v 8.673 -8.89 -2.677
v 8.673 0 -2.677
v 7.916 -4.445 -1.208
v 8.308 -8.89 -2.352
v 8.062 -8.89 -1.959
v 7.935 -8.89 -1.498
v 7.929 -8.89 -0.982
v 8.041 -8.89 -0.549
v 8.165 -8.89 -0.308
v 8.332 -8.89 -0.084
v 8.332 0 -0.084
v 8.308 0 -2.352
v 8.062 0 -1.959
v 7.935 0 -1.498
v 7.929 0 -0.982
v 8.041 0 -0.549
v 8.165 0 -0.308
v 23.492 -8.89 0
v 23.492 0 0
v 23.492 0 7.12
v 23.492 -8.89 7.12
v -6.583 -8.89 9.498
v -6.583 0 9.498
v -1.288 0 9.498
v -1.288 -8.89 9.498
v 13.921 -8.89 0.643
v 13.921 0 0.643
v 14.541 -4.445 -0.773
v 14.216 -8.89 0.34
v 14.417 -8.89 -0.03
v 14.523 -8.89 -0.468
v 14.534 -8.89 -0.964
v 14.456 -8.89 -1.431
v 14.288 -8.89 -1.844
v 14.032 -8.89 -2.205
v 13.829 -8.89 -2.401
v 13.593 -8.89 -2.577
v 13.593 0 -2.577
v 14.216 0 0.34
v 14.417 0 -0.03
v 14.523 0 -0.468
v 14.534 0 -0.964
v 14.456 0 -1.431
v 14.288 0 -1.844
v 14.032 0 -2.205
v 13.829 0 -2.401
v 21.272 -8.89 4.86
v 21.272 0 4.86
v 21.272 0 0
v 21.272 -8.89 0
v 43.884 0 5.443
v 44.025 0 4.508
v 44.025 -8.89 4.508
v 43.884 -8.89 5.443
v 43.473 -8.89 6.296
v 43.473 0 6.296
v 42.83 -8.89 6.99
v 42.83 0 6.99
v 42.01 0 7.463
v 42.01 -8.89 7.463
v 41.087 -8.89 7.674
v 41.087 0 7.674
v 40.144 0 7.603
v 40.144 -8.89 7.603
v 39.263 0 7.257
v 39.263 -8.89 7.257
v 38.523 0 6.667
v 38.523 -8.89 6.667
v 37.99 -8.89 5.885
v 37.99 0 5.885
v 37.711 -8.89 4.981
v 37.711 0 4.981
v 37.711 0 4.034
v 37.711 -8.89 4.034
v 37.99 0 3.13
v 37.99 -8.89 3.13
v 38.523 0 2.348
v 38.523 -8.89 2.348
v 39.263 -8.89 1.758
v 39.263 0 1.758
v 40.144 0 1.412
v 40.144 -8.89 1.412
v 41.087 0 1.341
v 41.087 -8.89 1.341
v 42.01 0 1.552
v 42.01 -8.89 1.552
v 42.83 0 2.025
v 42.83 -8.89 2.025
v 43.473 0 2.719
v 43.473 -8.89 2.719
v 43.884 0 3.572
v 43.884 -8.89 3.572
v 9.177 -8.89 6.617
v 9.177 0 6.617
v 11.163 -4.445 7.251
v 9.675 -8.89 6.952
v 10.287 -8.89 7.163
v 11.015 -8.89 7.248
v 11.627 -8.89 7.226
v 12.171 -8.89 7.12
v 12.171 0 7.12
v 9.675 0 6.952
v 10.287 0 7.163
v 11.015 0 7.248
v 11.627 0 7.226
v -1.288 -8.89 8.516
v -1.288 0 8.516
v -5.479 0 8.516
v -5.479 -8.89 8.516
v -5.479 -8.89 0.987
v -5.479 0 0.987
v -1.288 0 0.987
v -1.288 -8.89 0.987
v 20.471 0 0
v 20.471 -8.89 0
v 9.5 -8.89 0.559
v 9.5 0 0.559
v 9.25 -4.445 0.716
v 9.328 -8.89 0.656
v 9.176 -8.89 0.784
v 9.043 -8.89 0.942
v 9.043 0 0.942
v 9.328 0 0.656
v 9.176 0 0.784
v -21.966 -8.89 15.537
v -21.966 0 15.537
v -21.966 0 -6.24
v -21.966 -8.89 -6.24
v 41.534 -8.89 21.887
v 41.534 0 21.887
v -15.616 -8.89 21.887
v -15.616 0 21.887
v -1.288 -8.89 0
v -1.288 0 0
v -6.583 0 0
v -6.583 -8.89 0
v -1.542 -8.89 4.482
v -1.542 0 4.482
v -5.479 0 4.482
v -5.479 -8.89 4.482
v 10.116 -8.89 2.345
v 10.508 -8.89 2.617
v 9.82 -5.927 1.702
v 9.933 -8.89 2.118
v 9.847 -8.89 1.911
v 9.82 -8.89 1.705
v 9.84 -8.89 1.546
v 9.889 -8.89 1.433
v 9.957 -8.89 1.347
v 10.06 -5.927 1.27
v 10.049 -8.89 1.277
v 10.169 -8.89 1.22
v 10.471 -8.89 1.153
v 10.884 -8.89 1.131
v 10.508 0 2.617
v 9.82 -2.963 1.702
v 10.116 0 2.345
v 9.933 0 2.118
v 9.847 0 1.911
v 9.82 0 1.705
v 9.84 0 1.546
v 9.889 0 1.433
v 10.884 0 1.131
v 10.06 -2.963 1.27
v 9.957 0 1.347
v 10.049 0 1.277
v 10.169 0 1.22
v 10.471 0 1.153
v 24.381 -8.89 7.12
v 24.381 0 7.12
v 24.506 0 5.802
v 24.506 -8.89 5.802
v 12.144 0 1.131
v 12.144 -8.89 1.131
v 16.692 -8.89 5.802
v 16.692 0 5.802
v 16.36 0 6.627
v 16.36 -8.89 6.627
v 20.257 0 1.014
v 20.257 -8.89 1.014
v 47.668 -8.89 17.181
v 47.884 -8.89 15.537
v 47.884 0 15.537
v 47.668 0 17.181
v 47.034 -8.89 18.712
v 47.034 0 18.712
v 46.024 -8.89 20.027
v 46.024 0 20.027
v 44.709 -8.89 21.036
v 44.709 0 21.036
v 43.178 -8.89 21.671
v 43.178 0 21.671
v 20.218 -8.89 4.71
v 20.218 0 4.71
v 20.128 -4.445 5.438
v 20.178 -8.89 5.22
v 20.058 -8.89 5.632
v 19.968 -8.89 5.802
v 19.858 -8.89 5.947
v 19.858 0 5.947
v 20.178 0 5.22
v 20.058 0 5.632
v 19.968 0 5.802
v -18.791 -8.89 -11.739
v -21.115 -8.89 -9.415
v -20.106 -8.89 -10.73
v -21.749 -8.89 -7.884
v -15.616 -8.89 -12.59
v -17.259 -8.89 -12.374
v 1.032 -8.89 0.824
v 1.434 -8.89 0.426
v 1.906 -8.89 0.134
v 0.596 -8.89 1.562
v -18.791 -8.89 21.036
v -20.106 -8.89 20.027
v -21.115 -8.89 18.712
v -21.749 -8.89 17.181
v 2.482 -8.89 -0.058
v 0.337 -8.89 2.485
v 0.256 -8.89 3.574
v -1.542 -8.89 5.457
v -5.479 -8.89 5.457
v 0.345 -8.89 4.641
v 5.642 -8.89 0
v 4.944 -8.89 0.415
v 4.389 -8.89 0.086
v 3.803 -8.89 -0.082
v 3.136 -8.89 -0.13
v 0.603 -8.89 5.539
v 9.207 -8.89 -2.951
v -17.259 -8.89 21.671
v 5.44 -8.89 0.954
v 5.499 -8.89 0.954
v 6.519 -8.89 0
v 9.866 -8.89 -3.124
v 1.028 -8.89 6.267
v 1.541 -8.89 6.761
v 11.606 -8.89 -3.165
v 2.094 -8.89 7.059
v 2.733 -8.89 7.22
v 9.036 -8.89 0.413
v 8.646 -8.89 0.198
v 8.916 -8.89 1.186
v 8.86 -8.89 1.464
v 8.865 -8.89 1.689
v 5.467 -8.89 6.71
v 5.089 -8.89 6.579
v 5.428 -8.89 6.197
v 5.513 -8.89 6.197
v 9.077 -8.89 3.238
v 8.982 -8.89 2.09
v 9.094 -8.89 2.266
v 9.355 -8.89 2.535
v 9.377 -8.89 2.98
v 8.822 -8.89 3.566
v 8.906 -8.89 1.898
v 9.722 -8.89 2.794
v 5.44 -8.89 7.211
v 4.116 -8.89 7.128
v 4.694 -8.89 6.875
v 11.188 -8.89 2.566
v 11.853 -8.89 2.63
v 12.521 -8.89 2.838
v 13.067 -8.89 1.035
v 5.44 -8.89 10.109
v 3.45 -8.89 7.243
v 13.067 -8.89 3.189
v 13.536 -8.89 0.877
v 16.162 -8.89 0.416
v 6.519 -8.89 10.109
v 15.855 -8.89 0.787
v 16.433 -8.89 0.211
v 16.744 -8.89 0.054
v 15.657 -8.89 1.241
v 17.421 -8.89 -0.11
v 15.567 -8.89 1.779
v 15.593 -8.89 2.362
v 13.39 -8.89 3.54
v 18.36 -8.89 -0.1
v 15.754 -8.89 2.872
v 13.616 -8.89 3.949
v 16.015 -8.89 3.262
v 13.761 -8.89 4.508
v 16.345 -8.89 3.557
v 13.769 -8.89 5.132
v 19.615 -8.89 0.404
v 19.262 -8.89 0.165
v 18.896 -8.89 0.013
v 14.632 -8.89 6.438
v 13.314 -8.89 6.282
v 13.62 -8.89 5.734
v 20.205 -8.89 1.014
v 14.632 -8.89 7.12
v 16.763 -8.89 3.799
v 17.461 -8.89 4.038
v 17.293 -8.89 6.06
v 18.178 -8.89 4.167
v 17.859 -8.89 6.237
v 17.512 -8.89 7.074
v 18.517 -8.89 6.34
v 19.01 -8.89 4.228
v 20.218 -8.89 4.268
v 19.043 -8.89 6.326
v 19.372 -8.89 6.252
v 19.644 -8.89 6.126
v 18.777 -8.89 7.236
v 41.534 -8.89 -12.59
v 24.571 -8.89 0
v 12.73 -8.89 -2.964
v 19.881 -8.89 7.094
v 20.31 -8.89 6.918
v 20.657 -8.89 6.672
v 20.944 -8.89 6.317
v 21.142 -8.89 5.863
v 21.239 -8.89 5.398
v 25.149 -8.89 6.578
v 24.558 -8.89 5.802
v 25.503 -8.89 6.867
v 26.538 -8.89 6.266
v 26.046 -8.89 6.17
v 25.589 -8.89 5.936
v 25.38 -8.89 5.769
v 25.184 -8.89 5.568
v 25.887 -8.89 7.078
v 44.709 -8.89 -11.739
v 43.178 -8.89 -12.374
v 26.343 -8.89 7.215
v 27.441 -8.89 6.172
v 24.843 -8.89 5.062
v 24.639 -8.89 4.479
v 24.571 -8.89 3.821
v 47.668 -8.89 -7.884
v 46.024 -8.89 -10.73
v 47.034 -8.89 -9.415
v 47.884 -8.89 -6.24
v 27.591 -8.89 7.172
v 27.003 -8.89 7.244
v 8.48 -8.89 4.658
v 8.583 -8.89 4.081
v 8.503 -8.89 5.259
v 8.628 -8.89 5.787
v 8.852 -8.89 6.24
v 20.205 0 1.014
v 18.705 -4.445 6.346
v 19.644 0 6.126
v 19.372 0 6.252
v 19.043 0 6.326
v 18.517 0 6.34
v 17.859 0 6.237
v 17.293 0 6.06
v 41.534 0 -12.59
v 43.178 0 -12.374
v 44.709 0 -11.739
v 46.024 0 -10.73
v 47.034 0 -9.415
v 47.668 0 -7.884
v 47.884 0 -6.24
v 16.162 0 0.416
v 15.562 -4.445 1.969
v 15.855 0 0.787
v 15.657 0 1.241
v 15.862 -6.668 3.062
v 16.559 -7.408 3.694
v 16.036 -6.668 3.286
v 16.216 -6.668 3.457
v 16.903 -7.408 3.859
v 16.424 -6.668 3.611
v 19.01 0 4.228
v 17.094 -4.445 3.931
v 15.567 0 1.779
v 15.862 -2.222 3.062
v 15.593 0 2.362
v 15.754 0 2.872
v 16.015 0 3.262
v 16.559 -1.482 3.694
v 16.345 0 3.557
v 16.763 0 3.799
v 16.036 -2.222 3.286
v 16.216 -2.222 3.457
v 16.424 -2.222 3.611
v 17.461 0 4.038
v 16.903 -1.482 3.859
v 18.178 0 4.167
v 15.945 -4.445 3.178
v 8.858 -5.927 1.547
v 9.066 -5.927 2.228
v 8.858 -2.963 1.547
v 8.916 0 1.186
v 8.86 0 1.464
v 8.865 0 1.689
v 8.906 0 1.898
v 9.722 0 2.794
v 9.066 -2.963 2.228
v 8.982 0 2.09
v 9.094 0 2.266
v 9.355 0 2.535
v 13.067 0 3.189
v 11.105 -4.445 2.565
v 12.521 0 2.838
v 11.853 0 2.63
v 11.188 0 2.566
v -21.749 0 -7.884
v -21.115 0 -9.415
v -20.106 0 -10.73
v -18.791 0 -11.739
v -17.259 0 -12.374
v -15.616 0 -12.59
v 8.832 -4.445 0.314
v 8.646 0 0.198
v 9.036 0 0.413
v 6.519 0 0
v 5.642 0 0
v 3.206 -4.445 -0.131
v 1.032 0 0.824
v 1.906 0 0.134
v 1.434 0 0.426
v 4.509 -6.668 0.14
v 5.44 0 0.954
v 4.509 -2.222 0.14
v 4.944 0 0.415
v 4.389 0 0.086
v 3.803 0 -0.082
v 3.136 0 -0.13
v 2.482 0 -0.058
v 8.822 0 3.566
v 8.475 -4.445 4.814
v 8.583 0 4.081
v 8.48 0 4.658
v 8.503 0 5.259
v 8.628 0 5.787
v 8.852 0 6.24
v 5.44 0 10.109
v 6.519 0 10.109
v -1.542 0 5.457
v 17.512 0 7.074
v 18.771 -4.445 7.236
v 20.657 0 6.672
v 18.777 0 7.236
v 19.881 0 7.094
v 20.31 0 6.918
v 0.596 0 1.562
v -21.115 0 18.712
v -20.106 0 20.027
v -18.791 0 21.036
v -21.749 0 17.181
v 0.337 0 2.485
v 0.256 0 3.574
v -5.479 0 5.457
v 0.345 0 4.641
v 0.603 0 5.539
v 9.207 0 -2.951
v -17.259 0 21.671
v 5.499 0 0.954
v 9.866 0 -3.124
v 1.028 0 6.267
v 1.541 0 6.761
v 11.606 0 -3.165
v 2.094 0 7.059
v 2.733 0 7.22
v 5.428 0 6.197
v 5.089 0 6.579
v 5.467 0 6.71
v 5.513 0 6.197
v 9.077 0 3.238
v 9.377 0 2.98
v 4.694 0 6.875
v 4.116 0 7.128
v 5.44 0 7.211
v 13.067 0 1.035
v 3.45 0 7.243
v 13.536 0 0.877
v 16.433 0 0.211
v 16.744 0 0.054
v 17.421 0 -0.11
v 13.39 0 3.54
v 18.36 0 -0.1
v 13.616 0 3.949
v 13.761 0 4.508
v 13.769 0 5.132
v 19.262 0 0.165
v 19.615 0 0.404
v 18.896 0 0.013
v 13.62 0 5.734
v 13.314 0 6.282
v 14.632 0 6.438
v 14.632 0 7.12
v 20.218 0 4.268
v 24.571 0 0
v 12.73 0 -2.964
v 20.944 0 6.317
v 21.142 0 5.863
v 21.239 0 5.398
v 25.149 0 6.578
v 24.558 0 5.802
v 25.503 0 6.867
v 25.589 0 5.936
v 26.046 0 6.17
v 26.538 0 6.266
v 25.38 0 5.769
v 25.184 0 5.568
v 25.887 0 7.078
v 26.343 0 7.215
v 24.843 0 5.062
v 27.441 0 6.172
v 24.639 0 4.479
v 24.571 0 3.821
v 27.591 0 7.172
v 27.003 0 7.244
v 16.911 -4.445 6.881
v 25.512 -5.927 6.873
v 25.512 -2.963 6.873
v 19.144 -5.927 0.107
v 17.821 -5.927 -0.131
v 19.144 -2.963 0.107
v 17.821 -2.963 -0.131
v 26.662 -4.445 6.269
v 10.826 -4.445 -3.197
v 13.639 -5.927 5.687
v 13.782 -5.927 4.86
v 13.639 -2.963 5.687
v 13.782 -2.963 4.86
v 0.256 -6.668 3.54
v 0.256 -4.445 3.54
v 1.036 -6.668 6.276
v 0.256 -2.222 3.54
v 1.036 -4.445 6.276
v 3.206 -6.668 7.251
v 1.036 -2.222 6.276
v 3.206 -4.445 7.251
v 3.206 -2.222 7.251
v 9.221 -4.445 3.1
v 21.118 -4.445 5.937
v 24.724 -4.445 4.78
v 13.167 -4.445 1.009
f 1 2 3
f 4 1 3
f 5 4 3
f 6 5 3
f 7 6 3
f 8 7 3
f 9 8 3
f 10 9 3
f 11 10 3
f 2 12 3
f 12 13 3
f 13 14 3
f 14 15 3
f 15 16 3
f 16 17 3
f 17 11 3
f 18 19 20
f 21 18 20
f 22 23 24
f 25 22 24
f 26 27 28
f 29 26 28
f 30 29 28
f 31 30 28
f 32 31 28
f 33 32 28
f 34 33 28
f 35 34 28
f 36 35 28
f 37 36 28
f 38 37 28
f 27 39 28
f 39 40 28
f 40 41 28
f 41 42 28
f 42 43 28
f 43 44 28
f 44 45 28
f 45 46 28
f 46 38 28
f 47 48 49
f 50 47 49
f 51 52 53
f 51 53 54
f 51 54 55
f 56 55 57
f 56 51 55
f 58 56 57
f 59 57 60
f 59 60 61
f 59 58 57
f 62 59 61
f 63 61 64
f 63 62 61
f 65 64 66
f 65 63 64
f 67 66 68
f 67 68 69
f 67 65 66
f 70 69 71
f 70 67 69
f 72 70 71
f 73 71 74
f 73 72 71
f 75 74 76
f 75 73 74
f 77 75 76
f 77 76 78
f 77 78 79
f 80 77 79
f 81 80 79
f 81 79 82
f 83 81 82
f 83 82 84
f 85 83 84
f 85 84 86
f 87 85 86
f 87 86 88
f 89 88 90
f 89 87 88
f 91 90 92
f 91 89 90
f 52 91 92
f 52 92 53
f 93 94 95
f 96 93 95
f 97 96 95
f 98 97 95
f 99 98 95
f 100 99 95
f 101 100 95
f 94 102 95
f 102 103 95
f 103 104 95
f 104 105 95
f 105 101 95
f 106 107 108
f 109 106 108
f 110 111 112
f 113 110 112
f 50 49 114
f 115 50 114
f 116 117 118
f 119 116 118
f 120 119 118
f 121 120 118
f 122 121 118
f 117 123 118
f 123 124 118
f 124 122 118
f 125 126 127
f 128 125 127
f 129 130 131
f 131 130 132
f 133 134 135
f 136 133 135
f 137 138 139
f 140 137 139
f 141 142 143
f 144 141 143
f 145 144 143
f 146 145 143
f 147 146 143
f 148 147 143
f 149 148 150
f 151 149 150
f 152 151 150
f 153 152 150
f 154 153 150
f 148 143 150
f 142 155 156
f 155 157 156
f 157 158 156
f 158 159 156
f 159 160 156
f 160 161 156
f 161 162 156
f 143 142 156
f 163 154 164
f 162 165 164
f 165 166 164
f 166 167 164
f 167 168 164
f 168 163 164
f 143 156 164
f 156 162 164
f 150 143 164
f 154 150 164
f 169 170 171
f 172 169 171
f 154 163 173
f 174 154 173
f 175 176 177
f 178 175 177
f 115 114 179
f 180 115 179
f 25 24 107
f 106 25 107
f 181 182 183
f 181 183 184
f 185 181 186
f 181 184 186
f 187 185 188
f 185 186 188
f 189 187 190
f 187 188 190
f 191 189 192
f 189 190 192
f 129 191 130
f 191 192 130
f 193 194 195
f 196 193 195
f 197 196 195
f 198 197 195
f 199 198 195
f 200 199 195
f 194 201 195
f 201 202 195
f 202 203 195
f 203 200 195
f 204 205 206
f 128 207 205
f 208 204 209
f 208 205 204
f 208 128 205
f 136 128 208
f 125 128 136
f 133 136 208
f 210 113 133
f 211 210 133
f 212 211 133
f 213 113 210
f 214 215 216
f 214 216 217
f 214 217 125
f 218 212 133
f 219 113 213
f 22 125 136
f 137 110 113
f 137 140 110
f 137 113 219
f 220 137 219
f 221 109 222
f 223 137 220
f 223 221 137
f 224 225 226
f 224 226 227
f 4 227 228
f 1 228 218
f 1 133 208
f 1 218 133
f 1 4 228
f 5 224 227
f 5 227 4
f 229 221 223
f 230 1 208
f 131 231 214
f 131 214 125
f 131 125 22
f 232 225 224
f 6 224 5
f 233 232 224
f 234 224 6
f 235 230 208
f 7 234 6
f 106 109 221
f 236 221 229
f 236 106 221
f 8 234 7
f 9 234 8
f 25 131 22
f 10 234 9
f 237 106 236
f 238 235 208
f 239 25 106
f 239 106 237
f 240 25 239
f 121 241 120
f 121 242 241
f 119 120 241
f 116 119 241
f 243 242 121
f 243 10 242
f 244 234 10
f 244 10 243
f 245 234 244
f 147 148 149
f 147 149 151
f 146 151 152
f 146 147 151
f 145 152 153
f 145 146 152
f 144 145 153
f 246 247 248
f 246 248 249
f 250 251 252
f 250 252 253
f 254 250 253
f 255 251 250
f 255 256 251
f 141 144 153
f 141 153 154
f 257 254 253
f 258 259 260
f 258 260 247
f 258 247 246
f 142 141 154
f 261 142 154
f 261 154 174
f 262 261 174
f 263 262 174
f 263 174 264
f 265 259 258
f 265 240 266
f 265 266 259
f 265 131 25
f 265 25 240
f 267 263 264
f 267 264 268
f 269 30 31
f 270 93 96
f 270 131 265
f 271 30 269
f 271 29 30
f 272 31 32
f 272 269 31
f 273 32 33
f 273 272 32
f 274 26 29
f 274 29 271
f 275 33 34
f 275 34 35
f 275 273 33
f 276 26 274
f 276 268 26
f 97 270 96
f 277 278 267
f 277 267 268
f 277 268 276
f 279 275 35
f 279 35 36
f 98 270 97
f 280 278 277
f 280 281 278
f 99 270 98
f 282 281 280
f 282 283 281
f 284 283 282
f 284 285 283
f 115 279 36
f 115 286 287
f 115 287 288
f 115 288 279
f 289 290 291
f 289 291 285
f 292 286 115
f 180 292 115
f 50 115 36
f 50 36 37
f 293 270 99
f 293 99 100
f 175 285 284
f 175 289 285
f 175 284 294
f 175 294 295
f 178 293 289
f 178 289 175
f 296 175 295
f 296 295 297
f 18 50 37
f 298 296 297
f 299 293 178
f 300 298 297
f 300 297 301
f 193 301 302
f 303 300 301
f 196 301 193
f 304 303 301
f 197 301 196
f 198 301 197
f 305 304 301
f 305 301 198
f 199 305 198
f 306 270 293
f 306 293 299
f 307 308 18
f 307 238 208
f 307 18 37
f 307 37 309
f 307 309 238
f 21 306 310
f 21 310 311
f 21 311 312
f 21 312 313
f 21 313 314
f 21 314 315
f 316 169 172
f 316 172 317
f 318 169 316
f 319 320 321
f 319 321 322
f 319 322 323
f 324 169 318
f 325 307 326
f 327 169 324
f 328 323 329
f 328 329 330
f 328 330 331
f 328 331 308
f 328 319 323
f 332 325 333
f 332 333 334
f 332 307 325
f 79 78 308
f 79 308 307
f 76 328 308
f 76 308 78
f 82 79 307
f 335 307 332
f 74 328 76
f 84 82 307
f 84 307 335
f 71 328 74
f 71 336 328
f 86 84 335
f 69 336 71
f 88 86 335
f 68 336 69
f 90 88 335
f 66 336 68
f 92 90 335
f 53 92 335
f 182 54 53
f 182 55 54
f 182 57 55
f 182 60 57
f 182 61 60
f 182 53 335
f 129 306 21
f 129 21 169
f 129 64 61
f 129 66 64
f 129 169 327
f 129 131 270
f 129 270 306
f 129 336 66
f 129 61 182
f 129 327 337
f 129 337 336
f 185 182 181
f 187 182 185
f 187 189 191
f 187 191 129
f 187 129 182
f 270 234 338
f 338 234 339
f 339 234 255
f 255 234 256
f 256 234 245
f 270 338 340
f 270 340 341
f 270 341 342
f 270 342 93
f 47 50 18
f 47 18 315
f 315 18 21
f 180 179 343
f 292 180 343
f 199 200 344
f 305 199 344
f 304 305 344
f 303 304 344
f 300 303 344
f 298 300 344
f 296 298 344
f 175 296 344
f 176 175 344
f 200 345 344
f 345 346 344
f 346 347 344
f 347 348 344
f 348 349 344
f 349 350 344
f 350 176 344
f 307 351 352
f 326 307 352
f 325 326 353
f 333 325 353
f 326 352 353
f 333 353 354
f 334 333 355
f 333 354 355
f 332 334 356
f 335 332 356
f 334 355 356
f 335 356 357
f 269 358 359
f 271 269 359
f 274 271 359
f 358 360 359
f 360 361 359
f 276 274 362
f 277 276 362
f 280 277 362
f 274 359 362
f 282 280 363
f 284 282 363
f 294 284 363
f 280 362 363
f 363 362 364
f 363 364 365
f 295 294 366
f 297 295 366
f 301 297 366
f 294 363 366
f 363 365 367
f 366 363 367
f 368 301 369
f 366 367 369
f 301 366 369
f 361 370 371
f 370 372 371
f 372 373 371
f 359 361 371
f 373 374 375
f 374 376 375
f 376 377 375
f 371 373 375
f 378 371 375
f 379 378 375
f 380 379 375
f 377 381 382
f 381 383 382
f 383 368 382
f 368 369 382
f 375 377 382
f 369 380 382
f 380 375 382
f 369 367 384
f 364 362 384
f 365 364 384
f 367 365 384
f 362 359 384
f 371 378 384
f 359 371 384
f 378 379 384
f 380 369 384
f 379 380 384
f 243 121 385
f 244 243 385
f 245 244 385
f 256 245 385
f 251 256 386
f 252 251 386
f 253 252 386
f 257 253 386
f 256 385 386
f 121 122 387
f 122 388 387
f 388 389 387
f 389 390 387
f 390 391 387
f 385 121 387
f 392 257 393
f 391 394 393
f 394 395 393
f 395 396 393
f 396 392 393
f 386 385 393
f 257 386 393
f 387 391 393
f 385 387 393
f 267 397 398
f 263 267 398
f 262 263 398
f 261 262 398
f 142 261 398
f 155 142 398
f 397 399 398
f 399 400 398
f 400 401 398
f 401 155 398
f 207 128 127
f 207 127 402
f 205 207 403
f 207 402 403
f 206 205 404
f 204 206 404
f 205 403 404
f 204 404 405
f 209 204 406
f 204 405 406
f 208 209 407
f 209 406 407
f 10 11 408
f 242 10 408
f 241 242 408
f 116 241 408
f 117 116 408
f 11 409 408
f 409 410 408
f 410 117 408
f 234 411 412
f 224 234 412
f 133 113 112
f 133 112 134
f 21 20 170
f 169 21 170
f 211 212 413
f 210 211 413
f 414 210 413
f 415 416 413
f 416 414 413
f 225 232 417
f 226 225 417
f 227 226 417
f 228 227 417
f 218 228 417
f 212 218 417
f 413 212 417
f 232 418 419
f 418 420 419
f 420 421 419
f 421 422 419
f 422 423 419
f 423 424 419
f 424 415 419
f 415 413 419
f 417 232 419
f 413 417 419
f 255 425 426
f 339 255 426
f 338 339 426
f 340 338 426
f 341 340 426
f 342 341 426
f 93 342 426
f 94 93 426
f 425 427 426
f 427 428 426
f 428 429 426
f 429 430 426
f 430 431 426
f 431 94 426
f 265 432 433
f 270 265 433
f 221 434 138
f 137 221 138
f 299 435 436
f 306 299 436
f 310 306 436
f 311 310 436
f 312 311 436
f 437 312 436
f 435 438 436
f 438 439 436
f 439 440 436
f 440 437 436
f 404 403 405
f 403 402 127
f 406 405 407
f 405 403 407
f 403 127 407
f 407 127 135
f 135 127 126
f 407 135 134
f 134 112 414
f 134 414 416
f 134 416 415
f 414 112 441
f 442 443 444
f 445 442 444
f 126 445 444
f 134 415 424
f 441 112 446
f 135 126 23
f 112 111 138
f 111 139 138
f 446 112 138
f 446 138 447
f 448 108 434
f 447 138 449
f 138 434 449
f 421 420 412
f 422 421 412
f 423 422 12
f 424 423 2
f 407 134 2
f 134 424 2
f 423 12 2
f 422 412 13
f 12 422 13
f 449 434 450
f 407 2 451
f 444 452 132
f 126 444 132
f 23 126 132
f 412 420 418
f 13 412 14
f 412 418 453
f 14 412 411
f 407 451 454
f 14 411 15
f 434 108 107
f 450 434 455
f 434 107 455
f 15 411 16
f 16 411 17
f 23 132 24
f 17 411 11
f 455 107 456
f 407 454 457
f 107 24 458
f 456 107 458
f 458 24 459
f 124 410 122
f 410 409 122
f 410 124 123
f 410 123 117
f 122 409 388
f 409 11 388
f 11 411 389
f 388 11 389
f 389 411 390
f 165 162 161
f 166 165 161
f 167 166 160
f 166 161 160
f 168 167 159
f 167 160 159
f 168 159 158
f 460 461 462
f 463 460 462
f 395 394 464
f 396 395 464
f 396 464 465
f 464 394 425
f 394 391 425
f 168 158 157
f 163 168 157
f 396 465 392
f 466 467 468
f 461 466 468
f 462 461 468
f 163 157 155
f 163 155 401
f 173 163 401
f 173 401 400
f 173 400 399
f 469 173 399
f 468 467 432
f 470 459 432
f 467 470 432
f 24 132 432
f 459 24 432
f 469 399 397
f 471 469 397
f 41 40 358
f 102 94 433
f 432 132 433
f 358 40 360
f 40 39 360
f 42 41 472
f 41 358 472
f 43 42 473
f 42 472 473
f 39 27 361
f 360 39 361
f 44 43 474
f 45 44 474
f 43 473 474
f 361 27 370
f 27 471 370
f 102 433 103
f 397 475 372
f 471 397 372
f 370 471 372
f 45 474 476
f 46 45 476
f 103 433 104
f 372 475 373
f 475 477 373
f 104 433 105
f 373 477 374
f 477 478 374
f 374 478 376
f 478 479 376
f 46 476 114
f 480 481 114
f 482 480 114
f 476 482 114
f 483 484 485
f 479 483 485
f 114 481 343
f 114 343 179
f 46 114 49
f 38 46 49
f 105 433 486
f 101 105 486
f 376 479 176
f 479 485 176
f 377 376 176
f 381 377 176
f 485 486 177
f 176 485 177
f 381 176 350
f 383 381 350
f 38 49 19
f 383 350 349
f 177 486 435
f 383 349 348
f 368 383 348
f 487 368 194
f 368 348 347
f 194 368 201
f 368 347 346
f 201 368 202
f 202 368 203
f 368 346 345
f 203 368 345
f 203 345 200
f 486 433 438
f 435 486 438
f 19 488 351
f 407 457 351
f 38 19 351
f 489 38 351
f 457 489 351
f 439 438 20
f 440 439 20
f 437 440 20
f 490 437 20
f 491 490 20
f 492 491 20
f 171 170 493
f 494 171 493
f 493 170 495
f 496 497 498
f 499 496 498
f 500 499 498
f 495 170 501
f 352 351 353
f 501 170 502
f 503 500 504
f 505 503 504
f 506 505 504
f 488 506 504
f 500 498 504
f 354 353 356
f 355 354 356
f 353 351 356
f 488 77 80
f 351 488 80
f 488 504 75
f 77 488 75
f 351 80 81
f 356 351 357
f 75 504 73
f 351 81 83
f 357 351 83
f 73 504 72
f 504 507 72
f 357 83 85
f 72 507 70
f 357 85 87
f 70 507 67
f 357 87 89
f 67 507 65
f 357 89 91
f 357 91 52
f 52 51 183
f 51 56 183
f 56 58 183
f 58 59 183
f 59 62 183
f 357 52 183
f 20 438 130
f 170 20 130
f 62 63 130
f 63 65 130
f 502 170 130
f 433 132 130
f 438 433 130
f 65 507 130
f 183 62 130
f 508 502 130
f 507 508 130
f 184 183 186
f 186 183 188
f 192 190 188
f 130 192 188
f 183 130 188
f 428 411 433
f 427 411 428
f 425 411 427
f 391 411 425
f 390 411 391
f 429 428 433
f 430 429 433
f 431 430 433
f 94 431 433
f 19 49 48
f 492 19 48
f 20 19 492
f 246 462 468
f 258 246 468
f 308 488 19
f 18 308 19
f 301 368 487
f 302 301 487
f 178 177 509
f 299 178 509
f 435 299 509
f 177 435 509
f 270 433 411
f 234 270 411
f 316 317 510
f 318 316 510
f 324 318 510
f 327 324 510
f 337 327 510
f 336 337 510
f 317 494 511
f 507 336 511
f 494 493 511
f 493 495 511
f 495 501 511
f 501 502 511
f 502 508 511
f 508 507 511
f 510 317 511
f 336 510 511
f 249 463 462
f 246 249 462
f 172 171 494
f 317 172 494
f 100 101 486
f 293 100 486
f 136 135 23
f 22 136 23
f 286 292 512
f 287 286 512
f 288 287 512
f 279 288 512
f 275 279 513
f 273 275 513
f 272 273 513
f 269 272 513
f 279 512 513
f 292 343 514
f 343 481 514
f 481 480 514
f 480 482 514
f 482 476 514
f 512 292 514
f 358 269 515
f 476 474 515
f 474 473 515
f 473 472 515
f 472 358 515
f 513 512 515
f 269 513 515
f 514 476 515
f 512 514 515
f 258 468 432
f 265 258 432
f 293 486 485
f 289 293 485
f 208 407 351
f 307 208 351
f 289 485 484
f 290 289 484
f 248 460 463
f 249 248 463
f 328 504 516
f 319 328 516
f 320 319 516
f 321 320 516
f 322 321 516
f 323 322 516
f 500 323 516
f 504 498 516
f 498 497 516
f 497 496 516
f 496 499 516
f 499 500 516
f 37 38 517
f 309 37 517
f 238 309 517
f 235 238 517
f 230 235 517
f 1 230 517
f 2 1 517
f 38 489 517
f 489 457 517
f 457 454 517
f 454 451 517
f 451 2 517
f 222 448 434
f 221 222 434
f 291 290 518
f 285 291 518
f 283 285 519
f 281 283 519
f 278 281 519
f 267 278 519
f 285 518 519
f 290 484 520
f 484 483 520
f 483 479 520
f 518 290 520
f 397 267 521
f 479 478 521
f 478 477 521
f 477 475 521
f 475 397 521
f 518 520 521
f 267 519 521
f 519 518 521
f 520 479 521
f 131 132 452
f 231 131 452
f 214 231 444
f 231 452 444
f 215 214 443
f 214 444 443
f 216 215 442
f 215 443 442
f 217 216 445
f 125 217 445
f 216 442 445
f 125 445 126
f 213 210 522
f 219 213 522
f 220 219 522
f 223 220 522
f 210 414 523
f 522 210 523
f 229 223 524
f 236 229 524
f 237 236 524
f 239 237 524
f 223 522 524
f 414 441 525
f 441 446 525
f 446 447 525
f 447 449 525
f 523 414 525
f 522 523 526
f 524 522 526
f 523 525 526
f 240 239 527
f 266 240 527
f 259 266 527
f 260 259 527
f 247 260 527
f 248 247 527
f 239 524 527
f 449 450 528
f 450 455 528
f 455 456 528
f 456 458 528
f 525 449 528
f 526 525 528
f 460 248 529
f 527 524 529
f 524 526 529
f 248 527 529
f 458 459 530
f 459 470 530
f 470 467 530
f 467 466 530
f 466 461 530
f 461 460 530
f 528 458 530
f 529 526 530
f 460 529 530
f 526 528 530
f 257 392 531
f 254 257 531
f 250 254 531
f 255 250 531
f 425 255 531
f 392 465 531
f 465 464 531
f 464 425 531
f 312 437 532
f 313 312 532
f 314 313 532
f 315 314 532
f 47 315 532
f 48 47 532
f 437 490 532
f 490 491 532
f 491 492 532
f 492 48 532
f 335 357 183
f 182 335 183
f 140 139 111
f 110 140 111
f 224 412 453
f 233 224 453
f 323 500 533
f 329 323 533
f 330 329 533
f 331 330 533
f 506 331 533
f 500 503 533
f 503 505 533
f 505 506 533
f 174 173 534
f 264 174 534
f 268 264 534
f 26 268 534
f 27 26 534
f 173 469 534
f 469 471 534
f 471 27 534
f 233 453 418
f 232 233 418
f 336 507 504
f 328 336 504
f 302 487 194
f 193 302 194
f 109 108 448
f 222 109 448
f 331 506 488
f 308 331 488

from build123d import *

# Parameters (mm, degrees)
F0_R     = 3.175
F1_DEPTH = 8.89


with BuildPart() as f1:
    # F0 (on Front) → F1 (new body)
    with BuildSketch(Plane.XZ):
        with BuildLine():
            ThreePointArc((-21.9656324044, -6.2401519575), (-20.1057604649, -10.7302800181), (-15.6156324044, -12.5901519575))
            Line((-15.6156324044, -12.5901519575), (41.5343675956, -12.5901519575))
            ThreePointArc((41.5343675956, -12.5901519575), (46.0244956561, -10.7302800181), (47.8843675956, -6.2401519575))
            Line((47.8843675956, -6.2401519575), (47.8843675956, 15.5370884062))
            ThreePointArc((47.8843675956, 15.5370884062), (46.0244956561, 20.0272164667), (41.5343675956, 21.8870884062))
            Line((41.5343675956, 21.8870884062), (-15.6156324044, 21.8870884062))
            ThreePointArc((-15.6156324044, 21.8870884062), (-20.1057604649, 20.0272164667), (-21.9656324044, 15.5370884062))
            Line((-21.9656324044, 15.5370884062), (-21.9656324044, -6.2401519575))
        make_face()
        with BuildLine():
            Line((12.1711680144, 7.1195565384), (14.6323519389, 7.1195565384))
            Line((14.6323519389, 7.1195565384), (14.6323519389, 6.4377420729))
            Line((14.6323519389, 6.4377420729), (13.3144544658, 6.2818393749))
            add(Edge.make_bspline(
                [(13.3144544658, 6.2818393749), (13.4953015954, 6.0552607873), (13.6387320775, 5.6873304202)],
                knots=[0, 0, 0, 1, 1, 1], degree=2))
            add(Edge.make_bspline(
                [(13.6387320775, 5.6873304202), (13.7821625596, 5.3194000531), (13.7821625596, 4.8600067699)],
                knots=[0, 0, 0, 1, 1, 1], degree=2))
            add(Edge.make_bspline(
                [(13.7821625596, 4.8600067699), (13.7821625596, 3.8123406398), (13.0670888518, 3.1887298482)],
                knots=[0, 0, 0, 1, 1, 1], degree=2))
            add(Edge.make_bspline(
                [(13.0670888518, 3.1887298482), (12.352015144, 2.5651190565), (11.1047935606, 2.5651190565)],
                knots=[0, 0, 0, 1, 1, 1], degree=2))
            add(Edge.make_bspline(
                [(11.1047935606, 2.5651190565), (10.7867520569, 2.5651190565), (10.5082059032, 2.6170866224)],
                knots=[0, 0, 0, 1, 1, 1], degree=2))
            add(Edge.make_bspline(
                [(10.5082059032, 2.6170866224), (9.8201553297, 2.2533136606), (9.8201553297, 1.7024574613)],
                knots=[0, 0, 0, 1, 1, 1], degree=2))
            add(Edge.make_bspline(
                [(9.8201553297, 1.7024574613), (9.8201553297, 1.4093603892), (10.0602454845, 1.2700873124)],
                knots=[0, 0, 0, 1, 1, 1], degree=2))
            add(Edge.make_bspline(
                [(10.0602454845, 1.2700873124), (10.3003356393, 1.1308142356), (10.8844510809, 1.1308142356)],
                knots=[0, 0, 0, 1, 1, 1], degree=2))
            Line((10.8844510809, 1.1308142356), (12.1441448801, 1.1308142356))
            add(Edge.make_bspline(
                [(12.1441448801, 1.1308142356), (13.30198225, 1.1308142356), (13.9214356364, 0.6433584668)],
                knots=[0, 0, 0, 1, 1, 1], degree=2))
            add(Edge.make_bspline(
                [(13.9214356364, 0.6433584668), (14.5408890228, 0.1559026979), (14.5408890228, -0.7732773817)],
                knots=[0, 0, 0, 1, 1, 1], degree=2))
            add(Edge.make_bspline(
                [(14.5408890228, -0.7732773817), (14.5408890228, -1.9560591833), (13.5930006194, -2.576551921)],
                knots=[0, 0, 0, 1, 1, 1], degree=2))
            add(Edge.make_bspline(
                [(13.5930006194, -2.576551921), (12.6451122161, -3.1970446587), (10.826247407, -3.1970446587)],
                knots=[0, 0, 0, 1, 1, 1], degree=2))
            add(Edge.make_bspline(
                [(10.826247407, -3.1970446587), (9.4293592336, -3.1970446587), (8.672711473, -2.677368999)],
                knots=[0, 0, 0, 1, 1, 1], degree=2))
            add(Edge.make_bspline(
                [(8.672711473, -2.677368999), (7.9160637125, -2.1576933392), (7.9160637125, -1.2077262332)],
                knots=[0, 0, 0, 1, 1, 1], degree=2))
            add(Edge.make_bspline(
                [(7.9160637125, -1.2077262332), (7.9160637125, -0.5591710099), (8.3318042402, -0.0841874569)],
                knots=[0, 0, 0, 1, 1, 1], degree=2))
            add(Edge.make_bspline(
                [(8.3318042402, -0.0841874569), (8.747544768, 0.3907960961), (9.5000351233, 0.5591710099)],
                knots=[0, 0, 0, 1, 1, 1], degree=2))
            add(Edge.make_bspline(
                [(9.5000351233, 0.5591710099), (9.2277250776, 0.6818144656), (9.0427205428, 0.9416522954)],
                knots=[0, 0, 0, 1, 1, 1], degree=2))
            add(Edge.make_bspline(
                [(9.0427205428, 0.9416522954), (8.8577160079, 1.2014901253), (8.8577160079, 1.5465547634)],
                knots=[0, 0, 0, 1, 1, 1], degree=2))
            add(Edge.make_bspline(
                [(8.8577160079, 1.5465547634), (8.8577160079, 1.9352721569), (9.0655862718, 2.228369229)],
                knots=[0, 0, 0, 1, 1, 1], degree=2))
            add(Edge.make_bspline(
                [(9.0655862718, 2.228369229), (9.2734565357, 2.5214663011), (9.7224563057, 2.7937763468)],
                knots=[0, 0, 0, 1, 1, 1], degree=2))
            add(Edge.make_bspline(
                [(9.7224563057, 2.7937763468), (9.1695214037, 3.0203549344), (8.822378063, 3.5660143771)],
                knots=[0, 0, 0, 1, 1, 1], degree=2))
            add(Edge.make_bspline(
                [(8.822378063, 3.5660143771), (8.4752347223, 4.1116738199), (8.4752347223, 4.8142753118)],
                knots=[0, 0, 0, 1, 1, 1], degree=2))
            add(Edge.make_bspline(
                [(8.4752347223, 4.8142753118), (8.4752347223, 5.9825061949), (9.176796863, 6.6165104998)],
                knots=[0, 0, 0, 1, 1, 1], degree=2))
            add(Edge.make_bspline(
                [(9.176796863, 6.6165104998), (9.8783590036, 7.2505148047), (11.1629972345, 7.2505148047)],
                knots=[0, 0, 0, 1, 1, 1], degree=2))
            add(Edge.make_bspline(
                [(11.1629972345, 7.2505148047), (11.7221682444, 7.2505148047), (12.1711680144, 7.1195565384)],
                knots=[0, 0, 0, 1, 1, 1], degree=2))
        make_face(mode=Mode.SUBTRACT)
        with BuildLine():
            Line((21.2717281678, 0), (20.4714276518, 0))
            Line((20.4714276518, 0), (20.2573212799, 1.0144068878))
            Line((20.2573212799, 1.0144068878), (20.205353714, 1.0144068878))
            add(Edge.make_bspline(
                [(20.205353714, 1.0144068878), (19.6732058384, 0.3450646381), (19.1441760168, 0.1070531859)],
                knots=[0, 0, 0, 1, 1, 1], degree=2))
            add(Edge.make_bspline(
                [(19.1441760168, 0.1070531859), (18.6151461952, -0.1309582663), (17.8210817871, -0.1309582663)],
                knots=[0, 0, 0, 1, 1, 1], degree=2))
            add(Edge.make_bspline(
                [(17.8210817871, -0.1309582663), (16.7630221439, -0.1309582663), (16.1622770812, 0.4157405278)],
                knots=[0, 0, 0, 1, 1, 1], degree=2))
            add(Edge.make_bspline(
                [(16.1622770812, 0.4157405278), (15.5615320185, 0.9624393218), (15.5615320185, 1.9685313991)],
                knots=[0, 0, 0, 1, 1, 1], degree=2))
            add(Edge.make_bspline(
                [(15.5615320185, 1.9685313991), (15.5615320185, 4.1241460357), (19.0100996966, 4.2280811676)],
                knots=[0, 0, 0, 1, 1, 1], degree=2))
            Line((19.0100996966, 4.2280811676), (20.2178259298, 4.2675765178))
            Line((20.2178259298, 4.2675765178), (20.2178259298, 4.7103401799))
            add(Edge.make_bspline(
                [(20.2178259298, 4.7103401799), (20.2178259298, 5.5480573434), (19.8582103733, 5.9471682501)],
                knots=[0, 0, 0, 1, 1, 1], degree=2))
            add(Edge.make_bspline(
                [(19.8582103733, 5.9471682501), (19.4985948167, 6.3462791567), (18.7045304086, 6.3462791567)],
                knots=[0, 0, 0, 1, 1, 1], degree=2))
            add(Edge.make_bspline(
                [(18.7045304086, 6.3462791567), (17.8148456792, 6.3462791567), (16.6923462541, 5.8016590653)],
                knots=[0, 0, 0, 1, 1, 1], degree=2))
            Line((16.6923462541, 5.8016590653), (16.3597538319, 6.626904013))
            add(Edge.make_bspline(
                [(16.3597538319, 6.626904013), (16.8856655996, 6.9116862745), (17.5123944452, 7.0738250804)],
                knots=[0, 0, 0, 1, 1, 1], degree=2))
            add(Edge.make_bspline(
                [(17.5123944452, 7.0738250804), (18.1391232908, 7.2359638862), (18.7710488931, 7.2359638862)],
                knots=[0, 0, 0, 1, 1, 1], degree=2))
            add(Edge.make_bspline(
                [(18.7710488931, 7.2359638862), (20.0432149081, 7.2359638862), (20.6574715379, 6.6715961197)],
                knots=[0, 0, 0, 1, 1, 1], degree=2))
            add(Edge.make_bspline(
                [(20.6574715379, 6.6715961197), (21.2717281678, 6.1072283533), (21.2717281678, 4.8600067699)],
                knots=[0, 0, 0, 1, 1, 1], degree=2))
            Line((21.2717281678, 4.8600067699), (21.2717281678, 0))
        make_face(mode=Mode.SUBTRACT)
        with BuildLine():
            add(Edge.make_bspline(
                [(25.5122815512, 6.8732302757), (26.0714525611, 7.2505148047), (26.7407948108, 7.2505148047)],
                knots=[0, 0, 0, 1, 1, 1], degree=2))
            add(Edge.make_bspline(
                [(26.7407948108, 7.2505148047), (27.2147390125, 7.2505148047), (27.5909841902, 7.1715241044)],
                knots=[0, 0, 0, 1, 1, 1], degree=2))
            Line((27.5909841902, 7.1715241044), (27.4413176002, 6.1716681351))
            add(Edge.make_bspline(
                [(27.4413176002, 6.1716681351), (27.0006326407, 6.2693671591), (26.6618041106, 6.2693671591)],
                knots=[0, 0, 0, 1, 1, 1], degree=2))
            add(Edge.make_bspline(
                [(26.6618041106, 6.2693671591), (25.7970638128, 6.2693671591), (25.1838465343, 5.5678050184)],
                knots=[0, 0, 0, 1, 1, 1], degree=2))
            add(Edge.make_bspline(
                [(25.1838465343, 5.5678050184), (24.5706292558, 4.8662428778), (24.5706292558, 3.8206554504)],
                knots=[0, 0, 0, 1, 1, 1], degree=2))
            Line((24.5706292558, 3.8206554504), (24.5706292558, 0))
            Line((24.5706292558, 0), (23.4917825862, 0))
            Line((23.4917825862, 0), (23.4917825862, 7.1195565384))
            Line((23.4917825862, 7.1195565384), (24.3814673156, 7.1195565384))
            Line((24.3814673156, 7.1195565384), (24.506189474, 5.8016590653))
            Line((24.506189474, 5.8016590653), (24.5581570399, 5.8016590653))
            add(Edge.make_bspline(
                [(24.5581570399, 5.8016590653), (24.9531105413, 6.4959457467), (25.5122815512, 6.8732302757)],
                knots=[0, 0, 0, 1, 1, 1], degree=2))
        make_face(mode=Mode.SUBTRACT)
        with Locations((40.8501774073, 4.5076054521)):
            Circle(F0_R, mode=Mode.SUBTRACT)
        Polygon((-1.2884315729, 0.9873837535), (-1.2884315729, 0), (-6.5828871943, 0), (-6.5828871943, 9.4975923574), (-1.2884315729, 9.4975923574), (-1.2884315729, 8.5164447118), (-5.479096093, 8.5164447118), (-5.479096093, 5.4565944273), (-1.5420332948, 5.4565944273), (-1.5420332948, 4.4816828896), (-5.479096093, 4.4816828896), (-5.479096093, 0.9873837535), align=None, mode=Mode.SUBTRACT)
        with BuildLine():
            Line((5.6419630254, 0), (5.4985325433, 0.9541245113))
            Line((5.4985325433, 0.9541245113), (5.4403288695, 0.9541245113))
            add(Edge.make_bspline(
                [(5.4403288695, 0.9541245113), (4.6940746221, -0.1309582663), (3.2057235326, -0.1309582663)],
                knots=[0, 0, 0, 1, 1, 1], degree=2))
            add(Edge.make_bspline(
                [(3.2057235326, -0.1309582663), (1.8088353592, -0.1309582663), (1.0324399235, 0.8242055963)],
                knots=[0, 0, 0, 1, 1, 1], degree=2))
            add(Edge.make_bspline(
                [(1.0324399235, 0.8242055963), (0.2560444879, 1.7793694589), (0.2560444879, 3.5400305941)],
                knots=[0, 0, 0, 1, 1, 1], degree=2))
            add(Edge.make_bspline(
                [(0.2560444879, 3.5400305941), (0.2560444879, 5.3006917293), (1.0355579775, 6.275603267)],
                knots=[0, 0, 0, 1, 1, 1], degree=2))
            add(Edge.make_bspline(
                [(1.0355579775, 6.275603267), (1.8150714671, 7.2505148047), (3.2057235326, 7.2505148047)],
                knots=[0, 0, 0, 1, 1, 1], degree=2))
            add(Edge.make_bspline(
                [(3.2057235326, 7.2505148047), (4.6545792719, 7.2505148047), (5.4278566536, 6.1966125667)],
                knots=[0, 0, 0, 1, 1, 1], degree=2))
            Line((5.4278566536, 6.1966125667), (5.5130834618, 6.1966125667))
            Line((5.5130834618, 6.1966125667), (5.4673520038, 6.7100521186))
            Line((5.4673520038, 6.7100521186), (5.4403288695, 7.2110194545))
            Line((5.4403288695, 7.2110194545), (5.4403288695, 10.1087309332))
            Line((5.4403288695, 10.1087309332), (6.5191755391, 10.1087309332))
            Line((6.5191755391, 10.1087309332), (6.5191755391, 0))
            Line((6.5191755391, 0), (5.6419630254, 0))
        make_face(mode=Mode.SUBTRACT)
    extrude(amount=F1_DEPTH)


solid = f1.part
